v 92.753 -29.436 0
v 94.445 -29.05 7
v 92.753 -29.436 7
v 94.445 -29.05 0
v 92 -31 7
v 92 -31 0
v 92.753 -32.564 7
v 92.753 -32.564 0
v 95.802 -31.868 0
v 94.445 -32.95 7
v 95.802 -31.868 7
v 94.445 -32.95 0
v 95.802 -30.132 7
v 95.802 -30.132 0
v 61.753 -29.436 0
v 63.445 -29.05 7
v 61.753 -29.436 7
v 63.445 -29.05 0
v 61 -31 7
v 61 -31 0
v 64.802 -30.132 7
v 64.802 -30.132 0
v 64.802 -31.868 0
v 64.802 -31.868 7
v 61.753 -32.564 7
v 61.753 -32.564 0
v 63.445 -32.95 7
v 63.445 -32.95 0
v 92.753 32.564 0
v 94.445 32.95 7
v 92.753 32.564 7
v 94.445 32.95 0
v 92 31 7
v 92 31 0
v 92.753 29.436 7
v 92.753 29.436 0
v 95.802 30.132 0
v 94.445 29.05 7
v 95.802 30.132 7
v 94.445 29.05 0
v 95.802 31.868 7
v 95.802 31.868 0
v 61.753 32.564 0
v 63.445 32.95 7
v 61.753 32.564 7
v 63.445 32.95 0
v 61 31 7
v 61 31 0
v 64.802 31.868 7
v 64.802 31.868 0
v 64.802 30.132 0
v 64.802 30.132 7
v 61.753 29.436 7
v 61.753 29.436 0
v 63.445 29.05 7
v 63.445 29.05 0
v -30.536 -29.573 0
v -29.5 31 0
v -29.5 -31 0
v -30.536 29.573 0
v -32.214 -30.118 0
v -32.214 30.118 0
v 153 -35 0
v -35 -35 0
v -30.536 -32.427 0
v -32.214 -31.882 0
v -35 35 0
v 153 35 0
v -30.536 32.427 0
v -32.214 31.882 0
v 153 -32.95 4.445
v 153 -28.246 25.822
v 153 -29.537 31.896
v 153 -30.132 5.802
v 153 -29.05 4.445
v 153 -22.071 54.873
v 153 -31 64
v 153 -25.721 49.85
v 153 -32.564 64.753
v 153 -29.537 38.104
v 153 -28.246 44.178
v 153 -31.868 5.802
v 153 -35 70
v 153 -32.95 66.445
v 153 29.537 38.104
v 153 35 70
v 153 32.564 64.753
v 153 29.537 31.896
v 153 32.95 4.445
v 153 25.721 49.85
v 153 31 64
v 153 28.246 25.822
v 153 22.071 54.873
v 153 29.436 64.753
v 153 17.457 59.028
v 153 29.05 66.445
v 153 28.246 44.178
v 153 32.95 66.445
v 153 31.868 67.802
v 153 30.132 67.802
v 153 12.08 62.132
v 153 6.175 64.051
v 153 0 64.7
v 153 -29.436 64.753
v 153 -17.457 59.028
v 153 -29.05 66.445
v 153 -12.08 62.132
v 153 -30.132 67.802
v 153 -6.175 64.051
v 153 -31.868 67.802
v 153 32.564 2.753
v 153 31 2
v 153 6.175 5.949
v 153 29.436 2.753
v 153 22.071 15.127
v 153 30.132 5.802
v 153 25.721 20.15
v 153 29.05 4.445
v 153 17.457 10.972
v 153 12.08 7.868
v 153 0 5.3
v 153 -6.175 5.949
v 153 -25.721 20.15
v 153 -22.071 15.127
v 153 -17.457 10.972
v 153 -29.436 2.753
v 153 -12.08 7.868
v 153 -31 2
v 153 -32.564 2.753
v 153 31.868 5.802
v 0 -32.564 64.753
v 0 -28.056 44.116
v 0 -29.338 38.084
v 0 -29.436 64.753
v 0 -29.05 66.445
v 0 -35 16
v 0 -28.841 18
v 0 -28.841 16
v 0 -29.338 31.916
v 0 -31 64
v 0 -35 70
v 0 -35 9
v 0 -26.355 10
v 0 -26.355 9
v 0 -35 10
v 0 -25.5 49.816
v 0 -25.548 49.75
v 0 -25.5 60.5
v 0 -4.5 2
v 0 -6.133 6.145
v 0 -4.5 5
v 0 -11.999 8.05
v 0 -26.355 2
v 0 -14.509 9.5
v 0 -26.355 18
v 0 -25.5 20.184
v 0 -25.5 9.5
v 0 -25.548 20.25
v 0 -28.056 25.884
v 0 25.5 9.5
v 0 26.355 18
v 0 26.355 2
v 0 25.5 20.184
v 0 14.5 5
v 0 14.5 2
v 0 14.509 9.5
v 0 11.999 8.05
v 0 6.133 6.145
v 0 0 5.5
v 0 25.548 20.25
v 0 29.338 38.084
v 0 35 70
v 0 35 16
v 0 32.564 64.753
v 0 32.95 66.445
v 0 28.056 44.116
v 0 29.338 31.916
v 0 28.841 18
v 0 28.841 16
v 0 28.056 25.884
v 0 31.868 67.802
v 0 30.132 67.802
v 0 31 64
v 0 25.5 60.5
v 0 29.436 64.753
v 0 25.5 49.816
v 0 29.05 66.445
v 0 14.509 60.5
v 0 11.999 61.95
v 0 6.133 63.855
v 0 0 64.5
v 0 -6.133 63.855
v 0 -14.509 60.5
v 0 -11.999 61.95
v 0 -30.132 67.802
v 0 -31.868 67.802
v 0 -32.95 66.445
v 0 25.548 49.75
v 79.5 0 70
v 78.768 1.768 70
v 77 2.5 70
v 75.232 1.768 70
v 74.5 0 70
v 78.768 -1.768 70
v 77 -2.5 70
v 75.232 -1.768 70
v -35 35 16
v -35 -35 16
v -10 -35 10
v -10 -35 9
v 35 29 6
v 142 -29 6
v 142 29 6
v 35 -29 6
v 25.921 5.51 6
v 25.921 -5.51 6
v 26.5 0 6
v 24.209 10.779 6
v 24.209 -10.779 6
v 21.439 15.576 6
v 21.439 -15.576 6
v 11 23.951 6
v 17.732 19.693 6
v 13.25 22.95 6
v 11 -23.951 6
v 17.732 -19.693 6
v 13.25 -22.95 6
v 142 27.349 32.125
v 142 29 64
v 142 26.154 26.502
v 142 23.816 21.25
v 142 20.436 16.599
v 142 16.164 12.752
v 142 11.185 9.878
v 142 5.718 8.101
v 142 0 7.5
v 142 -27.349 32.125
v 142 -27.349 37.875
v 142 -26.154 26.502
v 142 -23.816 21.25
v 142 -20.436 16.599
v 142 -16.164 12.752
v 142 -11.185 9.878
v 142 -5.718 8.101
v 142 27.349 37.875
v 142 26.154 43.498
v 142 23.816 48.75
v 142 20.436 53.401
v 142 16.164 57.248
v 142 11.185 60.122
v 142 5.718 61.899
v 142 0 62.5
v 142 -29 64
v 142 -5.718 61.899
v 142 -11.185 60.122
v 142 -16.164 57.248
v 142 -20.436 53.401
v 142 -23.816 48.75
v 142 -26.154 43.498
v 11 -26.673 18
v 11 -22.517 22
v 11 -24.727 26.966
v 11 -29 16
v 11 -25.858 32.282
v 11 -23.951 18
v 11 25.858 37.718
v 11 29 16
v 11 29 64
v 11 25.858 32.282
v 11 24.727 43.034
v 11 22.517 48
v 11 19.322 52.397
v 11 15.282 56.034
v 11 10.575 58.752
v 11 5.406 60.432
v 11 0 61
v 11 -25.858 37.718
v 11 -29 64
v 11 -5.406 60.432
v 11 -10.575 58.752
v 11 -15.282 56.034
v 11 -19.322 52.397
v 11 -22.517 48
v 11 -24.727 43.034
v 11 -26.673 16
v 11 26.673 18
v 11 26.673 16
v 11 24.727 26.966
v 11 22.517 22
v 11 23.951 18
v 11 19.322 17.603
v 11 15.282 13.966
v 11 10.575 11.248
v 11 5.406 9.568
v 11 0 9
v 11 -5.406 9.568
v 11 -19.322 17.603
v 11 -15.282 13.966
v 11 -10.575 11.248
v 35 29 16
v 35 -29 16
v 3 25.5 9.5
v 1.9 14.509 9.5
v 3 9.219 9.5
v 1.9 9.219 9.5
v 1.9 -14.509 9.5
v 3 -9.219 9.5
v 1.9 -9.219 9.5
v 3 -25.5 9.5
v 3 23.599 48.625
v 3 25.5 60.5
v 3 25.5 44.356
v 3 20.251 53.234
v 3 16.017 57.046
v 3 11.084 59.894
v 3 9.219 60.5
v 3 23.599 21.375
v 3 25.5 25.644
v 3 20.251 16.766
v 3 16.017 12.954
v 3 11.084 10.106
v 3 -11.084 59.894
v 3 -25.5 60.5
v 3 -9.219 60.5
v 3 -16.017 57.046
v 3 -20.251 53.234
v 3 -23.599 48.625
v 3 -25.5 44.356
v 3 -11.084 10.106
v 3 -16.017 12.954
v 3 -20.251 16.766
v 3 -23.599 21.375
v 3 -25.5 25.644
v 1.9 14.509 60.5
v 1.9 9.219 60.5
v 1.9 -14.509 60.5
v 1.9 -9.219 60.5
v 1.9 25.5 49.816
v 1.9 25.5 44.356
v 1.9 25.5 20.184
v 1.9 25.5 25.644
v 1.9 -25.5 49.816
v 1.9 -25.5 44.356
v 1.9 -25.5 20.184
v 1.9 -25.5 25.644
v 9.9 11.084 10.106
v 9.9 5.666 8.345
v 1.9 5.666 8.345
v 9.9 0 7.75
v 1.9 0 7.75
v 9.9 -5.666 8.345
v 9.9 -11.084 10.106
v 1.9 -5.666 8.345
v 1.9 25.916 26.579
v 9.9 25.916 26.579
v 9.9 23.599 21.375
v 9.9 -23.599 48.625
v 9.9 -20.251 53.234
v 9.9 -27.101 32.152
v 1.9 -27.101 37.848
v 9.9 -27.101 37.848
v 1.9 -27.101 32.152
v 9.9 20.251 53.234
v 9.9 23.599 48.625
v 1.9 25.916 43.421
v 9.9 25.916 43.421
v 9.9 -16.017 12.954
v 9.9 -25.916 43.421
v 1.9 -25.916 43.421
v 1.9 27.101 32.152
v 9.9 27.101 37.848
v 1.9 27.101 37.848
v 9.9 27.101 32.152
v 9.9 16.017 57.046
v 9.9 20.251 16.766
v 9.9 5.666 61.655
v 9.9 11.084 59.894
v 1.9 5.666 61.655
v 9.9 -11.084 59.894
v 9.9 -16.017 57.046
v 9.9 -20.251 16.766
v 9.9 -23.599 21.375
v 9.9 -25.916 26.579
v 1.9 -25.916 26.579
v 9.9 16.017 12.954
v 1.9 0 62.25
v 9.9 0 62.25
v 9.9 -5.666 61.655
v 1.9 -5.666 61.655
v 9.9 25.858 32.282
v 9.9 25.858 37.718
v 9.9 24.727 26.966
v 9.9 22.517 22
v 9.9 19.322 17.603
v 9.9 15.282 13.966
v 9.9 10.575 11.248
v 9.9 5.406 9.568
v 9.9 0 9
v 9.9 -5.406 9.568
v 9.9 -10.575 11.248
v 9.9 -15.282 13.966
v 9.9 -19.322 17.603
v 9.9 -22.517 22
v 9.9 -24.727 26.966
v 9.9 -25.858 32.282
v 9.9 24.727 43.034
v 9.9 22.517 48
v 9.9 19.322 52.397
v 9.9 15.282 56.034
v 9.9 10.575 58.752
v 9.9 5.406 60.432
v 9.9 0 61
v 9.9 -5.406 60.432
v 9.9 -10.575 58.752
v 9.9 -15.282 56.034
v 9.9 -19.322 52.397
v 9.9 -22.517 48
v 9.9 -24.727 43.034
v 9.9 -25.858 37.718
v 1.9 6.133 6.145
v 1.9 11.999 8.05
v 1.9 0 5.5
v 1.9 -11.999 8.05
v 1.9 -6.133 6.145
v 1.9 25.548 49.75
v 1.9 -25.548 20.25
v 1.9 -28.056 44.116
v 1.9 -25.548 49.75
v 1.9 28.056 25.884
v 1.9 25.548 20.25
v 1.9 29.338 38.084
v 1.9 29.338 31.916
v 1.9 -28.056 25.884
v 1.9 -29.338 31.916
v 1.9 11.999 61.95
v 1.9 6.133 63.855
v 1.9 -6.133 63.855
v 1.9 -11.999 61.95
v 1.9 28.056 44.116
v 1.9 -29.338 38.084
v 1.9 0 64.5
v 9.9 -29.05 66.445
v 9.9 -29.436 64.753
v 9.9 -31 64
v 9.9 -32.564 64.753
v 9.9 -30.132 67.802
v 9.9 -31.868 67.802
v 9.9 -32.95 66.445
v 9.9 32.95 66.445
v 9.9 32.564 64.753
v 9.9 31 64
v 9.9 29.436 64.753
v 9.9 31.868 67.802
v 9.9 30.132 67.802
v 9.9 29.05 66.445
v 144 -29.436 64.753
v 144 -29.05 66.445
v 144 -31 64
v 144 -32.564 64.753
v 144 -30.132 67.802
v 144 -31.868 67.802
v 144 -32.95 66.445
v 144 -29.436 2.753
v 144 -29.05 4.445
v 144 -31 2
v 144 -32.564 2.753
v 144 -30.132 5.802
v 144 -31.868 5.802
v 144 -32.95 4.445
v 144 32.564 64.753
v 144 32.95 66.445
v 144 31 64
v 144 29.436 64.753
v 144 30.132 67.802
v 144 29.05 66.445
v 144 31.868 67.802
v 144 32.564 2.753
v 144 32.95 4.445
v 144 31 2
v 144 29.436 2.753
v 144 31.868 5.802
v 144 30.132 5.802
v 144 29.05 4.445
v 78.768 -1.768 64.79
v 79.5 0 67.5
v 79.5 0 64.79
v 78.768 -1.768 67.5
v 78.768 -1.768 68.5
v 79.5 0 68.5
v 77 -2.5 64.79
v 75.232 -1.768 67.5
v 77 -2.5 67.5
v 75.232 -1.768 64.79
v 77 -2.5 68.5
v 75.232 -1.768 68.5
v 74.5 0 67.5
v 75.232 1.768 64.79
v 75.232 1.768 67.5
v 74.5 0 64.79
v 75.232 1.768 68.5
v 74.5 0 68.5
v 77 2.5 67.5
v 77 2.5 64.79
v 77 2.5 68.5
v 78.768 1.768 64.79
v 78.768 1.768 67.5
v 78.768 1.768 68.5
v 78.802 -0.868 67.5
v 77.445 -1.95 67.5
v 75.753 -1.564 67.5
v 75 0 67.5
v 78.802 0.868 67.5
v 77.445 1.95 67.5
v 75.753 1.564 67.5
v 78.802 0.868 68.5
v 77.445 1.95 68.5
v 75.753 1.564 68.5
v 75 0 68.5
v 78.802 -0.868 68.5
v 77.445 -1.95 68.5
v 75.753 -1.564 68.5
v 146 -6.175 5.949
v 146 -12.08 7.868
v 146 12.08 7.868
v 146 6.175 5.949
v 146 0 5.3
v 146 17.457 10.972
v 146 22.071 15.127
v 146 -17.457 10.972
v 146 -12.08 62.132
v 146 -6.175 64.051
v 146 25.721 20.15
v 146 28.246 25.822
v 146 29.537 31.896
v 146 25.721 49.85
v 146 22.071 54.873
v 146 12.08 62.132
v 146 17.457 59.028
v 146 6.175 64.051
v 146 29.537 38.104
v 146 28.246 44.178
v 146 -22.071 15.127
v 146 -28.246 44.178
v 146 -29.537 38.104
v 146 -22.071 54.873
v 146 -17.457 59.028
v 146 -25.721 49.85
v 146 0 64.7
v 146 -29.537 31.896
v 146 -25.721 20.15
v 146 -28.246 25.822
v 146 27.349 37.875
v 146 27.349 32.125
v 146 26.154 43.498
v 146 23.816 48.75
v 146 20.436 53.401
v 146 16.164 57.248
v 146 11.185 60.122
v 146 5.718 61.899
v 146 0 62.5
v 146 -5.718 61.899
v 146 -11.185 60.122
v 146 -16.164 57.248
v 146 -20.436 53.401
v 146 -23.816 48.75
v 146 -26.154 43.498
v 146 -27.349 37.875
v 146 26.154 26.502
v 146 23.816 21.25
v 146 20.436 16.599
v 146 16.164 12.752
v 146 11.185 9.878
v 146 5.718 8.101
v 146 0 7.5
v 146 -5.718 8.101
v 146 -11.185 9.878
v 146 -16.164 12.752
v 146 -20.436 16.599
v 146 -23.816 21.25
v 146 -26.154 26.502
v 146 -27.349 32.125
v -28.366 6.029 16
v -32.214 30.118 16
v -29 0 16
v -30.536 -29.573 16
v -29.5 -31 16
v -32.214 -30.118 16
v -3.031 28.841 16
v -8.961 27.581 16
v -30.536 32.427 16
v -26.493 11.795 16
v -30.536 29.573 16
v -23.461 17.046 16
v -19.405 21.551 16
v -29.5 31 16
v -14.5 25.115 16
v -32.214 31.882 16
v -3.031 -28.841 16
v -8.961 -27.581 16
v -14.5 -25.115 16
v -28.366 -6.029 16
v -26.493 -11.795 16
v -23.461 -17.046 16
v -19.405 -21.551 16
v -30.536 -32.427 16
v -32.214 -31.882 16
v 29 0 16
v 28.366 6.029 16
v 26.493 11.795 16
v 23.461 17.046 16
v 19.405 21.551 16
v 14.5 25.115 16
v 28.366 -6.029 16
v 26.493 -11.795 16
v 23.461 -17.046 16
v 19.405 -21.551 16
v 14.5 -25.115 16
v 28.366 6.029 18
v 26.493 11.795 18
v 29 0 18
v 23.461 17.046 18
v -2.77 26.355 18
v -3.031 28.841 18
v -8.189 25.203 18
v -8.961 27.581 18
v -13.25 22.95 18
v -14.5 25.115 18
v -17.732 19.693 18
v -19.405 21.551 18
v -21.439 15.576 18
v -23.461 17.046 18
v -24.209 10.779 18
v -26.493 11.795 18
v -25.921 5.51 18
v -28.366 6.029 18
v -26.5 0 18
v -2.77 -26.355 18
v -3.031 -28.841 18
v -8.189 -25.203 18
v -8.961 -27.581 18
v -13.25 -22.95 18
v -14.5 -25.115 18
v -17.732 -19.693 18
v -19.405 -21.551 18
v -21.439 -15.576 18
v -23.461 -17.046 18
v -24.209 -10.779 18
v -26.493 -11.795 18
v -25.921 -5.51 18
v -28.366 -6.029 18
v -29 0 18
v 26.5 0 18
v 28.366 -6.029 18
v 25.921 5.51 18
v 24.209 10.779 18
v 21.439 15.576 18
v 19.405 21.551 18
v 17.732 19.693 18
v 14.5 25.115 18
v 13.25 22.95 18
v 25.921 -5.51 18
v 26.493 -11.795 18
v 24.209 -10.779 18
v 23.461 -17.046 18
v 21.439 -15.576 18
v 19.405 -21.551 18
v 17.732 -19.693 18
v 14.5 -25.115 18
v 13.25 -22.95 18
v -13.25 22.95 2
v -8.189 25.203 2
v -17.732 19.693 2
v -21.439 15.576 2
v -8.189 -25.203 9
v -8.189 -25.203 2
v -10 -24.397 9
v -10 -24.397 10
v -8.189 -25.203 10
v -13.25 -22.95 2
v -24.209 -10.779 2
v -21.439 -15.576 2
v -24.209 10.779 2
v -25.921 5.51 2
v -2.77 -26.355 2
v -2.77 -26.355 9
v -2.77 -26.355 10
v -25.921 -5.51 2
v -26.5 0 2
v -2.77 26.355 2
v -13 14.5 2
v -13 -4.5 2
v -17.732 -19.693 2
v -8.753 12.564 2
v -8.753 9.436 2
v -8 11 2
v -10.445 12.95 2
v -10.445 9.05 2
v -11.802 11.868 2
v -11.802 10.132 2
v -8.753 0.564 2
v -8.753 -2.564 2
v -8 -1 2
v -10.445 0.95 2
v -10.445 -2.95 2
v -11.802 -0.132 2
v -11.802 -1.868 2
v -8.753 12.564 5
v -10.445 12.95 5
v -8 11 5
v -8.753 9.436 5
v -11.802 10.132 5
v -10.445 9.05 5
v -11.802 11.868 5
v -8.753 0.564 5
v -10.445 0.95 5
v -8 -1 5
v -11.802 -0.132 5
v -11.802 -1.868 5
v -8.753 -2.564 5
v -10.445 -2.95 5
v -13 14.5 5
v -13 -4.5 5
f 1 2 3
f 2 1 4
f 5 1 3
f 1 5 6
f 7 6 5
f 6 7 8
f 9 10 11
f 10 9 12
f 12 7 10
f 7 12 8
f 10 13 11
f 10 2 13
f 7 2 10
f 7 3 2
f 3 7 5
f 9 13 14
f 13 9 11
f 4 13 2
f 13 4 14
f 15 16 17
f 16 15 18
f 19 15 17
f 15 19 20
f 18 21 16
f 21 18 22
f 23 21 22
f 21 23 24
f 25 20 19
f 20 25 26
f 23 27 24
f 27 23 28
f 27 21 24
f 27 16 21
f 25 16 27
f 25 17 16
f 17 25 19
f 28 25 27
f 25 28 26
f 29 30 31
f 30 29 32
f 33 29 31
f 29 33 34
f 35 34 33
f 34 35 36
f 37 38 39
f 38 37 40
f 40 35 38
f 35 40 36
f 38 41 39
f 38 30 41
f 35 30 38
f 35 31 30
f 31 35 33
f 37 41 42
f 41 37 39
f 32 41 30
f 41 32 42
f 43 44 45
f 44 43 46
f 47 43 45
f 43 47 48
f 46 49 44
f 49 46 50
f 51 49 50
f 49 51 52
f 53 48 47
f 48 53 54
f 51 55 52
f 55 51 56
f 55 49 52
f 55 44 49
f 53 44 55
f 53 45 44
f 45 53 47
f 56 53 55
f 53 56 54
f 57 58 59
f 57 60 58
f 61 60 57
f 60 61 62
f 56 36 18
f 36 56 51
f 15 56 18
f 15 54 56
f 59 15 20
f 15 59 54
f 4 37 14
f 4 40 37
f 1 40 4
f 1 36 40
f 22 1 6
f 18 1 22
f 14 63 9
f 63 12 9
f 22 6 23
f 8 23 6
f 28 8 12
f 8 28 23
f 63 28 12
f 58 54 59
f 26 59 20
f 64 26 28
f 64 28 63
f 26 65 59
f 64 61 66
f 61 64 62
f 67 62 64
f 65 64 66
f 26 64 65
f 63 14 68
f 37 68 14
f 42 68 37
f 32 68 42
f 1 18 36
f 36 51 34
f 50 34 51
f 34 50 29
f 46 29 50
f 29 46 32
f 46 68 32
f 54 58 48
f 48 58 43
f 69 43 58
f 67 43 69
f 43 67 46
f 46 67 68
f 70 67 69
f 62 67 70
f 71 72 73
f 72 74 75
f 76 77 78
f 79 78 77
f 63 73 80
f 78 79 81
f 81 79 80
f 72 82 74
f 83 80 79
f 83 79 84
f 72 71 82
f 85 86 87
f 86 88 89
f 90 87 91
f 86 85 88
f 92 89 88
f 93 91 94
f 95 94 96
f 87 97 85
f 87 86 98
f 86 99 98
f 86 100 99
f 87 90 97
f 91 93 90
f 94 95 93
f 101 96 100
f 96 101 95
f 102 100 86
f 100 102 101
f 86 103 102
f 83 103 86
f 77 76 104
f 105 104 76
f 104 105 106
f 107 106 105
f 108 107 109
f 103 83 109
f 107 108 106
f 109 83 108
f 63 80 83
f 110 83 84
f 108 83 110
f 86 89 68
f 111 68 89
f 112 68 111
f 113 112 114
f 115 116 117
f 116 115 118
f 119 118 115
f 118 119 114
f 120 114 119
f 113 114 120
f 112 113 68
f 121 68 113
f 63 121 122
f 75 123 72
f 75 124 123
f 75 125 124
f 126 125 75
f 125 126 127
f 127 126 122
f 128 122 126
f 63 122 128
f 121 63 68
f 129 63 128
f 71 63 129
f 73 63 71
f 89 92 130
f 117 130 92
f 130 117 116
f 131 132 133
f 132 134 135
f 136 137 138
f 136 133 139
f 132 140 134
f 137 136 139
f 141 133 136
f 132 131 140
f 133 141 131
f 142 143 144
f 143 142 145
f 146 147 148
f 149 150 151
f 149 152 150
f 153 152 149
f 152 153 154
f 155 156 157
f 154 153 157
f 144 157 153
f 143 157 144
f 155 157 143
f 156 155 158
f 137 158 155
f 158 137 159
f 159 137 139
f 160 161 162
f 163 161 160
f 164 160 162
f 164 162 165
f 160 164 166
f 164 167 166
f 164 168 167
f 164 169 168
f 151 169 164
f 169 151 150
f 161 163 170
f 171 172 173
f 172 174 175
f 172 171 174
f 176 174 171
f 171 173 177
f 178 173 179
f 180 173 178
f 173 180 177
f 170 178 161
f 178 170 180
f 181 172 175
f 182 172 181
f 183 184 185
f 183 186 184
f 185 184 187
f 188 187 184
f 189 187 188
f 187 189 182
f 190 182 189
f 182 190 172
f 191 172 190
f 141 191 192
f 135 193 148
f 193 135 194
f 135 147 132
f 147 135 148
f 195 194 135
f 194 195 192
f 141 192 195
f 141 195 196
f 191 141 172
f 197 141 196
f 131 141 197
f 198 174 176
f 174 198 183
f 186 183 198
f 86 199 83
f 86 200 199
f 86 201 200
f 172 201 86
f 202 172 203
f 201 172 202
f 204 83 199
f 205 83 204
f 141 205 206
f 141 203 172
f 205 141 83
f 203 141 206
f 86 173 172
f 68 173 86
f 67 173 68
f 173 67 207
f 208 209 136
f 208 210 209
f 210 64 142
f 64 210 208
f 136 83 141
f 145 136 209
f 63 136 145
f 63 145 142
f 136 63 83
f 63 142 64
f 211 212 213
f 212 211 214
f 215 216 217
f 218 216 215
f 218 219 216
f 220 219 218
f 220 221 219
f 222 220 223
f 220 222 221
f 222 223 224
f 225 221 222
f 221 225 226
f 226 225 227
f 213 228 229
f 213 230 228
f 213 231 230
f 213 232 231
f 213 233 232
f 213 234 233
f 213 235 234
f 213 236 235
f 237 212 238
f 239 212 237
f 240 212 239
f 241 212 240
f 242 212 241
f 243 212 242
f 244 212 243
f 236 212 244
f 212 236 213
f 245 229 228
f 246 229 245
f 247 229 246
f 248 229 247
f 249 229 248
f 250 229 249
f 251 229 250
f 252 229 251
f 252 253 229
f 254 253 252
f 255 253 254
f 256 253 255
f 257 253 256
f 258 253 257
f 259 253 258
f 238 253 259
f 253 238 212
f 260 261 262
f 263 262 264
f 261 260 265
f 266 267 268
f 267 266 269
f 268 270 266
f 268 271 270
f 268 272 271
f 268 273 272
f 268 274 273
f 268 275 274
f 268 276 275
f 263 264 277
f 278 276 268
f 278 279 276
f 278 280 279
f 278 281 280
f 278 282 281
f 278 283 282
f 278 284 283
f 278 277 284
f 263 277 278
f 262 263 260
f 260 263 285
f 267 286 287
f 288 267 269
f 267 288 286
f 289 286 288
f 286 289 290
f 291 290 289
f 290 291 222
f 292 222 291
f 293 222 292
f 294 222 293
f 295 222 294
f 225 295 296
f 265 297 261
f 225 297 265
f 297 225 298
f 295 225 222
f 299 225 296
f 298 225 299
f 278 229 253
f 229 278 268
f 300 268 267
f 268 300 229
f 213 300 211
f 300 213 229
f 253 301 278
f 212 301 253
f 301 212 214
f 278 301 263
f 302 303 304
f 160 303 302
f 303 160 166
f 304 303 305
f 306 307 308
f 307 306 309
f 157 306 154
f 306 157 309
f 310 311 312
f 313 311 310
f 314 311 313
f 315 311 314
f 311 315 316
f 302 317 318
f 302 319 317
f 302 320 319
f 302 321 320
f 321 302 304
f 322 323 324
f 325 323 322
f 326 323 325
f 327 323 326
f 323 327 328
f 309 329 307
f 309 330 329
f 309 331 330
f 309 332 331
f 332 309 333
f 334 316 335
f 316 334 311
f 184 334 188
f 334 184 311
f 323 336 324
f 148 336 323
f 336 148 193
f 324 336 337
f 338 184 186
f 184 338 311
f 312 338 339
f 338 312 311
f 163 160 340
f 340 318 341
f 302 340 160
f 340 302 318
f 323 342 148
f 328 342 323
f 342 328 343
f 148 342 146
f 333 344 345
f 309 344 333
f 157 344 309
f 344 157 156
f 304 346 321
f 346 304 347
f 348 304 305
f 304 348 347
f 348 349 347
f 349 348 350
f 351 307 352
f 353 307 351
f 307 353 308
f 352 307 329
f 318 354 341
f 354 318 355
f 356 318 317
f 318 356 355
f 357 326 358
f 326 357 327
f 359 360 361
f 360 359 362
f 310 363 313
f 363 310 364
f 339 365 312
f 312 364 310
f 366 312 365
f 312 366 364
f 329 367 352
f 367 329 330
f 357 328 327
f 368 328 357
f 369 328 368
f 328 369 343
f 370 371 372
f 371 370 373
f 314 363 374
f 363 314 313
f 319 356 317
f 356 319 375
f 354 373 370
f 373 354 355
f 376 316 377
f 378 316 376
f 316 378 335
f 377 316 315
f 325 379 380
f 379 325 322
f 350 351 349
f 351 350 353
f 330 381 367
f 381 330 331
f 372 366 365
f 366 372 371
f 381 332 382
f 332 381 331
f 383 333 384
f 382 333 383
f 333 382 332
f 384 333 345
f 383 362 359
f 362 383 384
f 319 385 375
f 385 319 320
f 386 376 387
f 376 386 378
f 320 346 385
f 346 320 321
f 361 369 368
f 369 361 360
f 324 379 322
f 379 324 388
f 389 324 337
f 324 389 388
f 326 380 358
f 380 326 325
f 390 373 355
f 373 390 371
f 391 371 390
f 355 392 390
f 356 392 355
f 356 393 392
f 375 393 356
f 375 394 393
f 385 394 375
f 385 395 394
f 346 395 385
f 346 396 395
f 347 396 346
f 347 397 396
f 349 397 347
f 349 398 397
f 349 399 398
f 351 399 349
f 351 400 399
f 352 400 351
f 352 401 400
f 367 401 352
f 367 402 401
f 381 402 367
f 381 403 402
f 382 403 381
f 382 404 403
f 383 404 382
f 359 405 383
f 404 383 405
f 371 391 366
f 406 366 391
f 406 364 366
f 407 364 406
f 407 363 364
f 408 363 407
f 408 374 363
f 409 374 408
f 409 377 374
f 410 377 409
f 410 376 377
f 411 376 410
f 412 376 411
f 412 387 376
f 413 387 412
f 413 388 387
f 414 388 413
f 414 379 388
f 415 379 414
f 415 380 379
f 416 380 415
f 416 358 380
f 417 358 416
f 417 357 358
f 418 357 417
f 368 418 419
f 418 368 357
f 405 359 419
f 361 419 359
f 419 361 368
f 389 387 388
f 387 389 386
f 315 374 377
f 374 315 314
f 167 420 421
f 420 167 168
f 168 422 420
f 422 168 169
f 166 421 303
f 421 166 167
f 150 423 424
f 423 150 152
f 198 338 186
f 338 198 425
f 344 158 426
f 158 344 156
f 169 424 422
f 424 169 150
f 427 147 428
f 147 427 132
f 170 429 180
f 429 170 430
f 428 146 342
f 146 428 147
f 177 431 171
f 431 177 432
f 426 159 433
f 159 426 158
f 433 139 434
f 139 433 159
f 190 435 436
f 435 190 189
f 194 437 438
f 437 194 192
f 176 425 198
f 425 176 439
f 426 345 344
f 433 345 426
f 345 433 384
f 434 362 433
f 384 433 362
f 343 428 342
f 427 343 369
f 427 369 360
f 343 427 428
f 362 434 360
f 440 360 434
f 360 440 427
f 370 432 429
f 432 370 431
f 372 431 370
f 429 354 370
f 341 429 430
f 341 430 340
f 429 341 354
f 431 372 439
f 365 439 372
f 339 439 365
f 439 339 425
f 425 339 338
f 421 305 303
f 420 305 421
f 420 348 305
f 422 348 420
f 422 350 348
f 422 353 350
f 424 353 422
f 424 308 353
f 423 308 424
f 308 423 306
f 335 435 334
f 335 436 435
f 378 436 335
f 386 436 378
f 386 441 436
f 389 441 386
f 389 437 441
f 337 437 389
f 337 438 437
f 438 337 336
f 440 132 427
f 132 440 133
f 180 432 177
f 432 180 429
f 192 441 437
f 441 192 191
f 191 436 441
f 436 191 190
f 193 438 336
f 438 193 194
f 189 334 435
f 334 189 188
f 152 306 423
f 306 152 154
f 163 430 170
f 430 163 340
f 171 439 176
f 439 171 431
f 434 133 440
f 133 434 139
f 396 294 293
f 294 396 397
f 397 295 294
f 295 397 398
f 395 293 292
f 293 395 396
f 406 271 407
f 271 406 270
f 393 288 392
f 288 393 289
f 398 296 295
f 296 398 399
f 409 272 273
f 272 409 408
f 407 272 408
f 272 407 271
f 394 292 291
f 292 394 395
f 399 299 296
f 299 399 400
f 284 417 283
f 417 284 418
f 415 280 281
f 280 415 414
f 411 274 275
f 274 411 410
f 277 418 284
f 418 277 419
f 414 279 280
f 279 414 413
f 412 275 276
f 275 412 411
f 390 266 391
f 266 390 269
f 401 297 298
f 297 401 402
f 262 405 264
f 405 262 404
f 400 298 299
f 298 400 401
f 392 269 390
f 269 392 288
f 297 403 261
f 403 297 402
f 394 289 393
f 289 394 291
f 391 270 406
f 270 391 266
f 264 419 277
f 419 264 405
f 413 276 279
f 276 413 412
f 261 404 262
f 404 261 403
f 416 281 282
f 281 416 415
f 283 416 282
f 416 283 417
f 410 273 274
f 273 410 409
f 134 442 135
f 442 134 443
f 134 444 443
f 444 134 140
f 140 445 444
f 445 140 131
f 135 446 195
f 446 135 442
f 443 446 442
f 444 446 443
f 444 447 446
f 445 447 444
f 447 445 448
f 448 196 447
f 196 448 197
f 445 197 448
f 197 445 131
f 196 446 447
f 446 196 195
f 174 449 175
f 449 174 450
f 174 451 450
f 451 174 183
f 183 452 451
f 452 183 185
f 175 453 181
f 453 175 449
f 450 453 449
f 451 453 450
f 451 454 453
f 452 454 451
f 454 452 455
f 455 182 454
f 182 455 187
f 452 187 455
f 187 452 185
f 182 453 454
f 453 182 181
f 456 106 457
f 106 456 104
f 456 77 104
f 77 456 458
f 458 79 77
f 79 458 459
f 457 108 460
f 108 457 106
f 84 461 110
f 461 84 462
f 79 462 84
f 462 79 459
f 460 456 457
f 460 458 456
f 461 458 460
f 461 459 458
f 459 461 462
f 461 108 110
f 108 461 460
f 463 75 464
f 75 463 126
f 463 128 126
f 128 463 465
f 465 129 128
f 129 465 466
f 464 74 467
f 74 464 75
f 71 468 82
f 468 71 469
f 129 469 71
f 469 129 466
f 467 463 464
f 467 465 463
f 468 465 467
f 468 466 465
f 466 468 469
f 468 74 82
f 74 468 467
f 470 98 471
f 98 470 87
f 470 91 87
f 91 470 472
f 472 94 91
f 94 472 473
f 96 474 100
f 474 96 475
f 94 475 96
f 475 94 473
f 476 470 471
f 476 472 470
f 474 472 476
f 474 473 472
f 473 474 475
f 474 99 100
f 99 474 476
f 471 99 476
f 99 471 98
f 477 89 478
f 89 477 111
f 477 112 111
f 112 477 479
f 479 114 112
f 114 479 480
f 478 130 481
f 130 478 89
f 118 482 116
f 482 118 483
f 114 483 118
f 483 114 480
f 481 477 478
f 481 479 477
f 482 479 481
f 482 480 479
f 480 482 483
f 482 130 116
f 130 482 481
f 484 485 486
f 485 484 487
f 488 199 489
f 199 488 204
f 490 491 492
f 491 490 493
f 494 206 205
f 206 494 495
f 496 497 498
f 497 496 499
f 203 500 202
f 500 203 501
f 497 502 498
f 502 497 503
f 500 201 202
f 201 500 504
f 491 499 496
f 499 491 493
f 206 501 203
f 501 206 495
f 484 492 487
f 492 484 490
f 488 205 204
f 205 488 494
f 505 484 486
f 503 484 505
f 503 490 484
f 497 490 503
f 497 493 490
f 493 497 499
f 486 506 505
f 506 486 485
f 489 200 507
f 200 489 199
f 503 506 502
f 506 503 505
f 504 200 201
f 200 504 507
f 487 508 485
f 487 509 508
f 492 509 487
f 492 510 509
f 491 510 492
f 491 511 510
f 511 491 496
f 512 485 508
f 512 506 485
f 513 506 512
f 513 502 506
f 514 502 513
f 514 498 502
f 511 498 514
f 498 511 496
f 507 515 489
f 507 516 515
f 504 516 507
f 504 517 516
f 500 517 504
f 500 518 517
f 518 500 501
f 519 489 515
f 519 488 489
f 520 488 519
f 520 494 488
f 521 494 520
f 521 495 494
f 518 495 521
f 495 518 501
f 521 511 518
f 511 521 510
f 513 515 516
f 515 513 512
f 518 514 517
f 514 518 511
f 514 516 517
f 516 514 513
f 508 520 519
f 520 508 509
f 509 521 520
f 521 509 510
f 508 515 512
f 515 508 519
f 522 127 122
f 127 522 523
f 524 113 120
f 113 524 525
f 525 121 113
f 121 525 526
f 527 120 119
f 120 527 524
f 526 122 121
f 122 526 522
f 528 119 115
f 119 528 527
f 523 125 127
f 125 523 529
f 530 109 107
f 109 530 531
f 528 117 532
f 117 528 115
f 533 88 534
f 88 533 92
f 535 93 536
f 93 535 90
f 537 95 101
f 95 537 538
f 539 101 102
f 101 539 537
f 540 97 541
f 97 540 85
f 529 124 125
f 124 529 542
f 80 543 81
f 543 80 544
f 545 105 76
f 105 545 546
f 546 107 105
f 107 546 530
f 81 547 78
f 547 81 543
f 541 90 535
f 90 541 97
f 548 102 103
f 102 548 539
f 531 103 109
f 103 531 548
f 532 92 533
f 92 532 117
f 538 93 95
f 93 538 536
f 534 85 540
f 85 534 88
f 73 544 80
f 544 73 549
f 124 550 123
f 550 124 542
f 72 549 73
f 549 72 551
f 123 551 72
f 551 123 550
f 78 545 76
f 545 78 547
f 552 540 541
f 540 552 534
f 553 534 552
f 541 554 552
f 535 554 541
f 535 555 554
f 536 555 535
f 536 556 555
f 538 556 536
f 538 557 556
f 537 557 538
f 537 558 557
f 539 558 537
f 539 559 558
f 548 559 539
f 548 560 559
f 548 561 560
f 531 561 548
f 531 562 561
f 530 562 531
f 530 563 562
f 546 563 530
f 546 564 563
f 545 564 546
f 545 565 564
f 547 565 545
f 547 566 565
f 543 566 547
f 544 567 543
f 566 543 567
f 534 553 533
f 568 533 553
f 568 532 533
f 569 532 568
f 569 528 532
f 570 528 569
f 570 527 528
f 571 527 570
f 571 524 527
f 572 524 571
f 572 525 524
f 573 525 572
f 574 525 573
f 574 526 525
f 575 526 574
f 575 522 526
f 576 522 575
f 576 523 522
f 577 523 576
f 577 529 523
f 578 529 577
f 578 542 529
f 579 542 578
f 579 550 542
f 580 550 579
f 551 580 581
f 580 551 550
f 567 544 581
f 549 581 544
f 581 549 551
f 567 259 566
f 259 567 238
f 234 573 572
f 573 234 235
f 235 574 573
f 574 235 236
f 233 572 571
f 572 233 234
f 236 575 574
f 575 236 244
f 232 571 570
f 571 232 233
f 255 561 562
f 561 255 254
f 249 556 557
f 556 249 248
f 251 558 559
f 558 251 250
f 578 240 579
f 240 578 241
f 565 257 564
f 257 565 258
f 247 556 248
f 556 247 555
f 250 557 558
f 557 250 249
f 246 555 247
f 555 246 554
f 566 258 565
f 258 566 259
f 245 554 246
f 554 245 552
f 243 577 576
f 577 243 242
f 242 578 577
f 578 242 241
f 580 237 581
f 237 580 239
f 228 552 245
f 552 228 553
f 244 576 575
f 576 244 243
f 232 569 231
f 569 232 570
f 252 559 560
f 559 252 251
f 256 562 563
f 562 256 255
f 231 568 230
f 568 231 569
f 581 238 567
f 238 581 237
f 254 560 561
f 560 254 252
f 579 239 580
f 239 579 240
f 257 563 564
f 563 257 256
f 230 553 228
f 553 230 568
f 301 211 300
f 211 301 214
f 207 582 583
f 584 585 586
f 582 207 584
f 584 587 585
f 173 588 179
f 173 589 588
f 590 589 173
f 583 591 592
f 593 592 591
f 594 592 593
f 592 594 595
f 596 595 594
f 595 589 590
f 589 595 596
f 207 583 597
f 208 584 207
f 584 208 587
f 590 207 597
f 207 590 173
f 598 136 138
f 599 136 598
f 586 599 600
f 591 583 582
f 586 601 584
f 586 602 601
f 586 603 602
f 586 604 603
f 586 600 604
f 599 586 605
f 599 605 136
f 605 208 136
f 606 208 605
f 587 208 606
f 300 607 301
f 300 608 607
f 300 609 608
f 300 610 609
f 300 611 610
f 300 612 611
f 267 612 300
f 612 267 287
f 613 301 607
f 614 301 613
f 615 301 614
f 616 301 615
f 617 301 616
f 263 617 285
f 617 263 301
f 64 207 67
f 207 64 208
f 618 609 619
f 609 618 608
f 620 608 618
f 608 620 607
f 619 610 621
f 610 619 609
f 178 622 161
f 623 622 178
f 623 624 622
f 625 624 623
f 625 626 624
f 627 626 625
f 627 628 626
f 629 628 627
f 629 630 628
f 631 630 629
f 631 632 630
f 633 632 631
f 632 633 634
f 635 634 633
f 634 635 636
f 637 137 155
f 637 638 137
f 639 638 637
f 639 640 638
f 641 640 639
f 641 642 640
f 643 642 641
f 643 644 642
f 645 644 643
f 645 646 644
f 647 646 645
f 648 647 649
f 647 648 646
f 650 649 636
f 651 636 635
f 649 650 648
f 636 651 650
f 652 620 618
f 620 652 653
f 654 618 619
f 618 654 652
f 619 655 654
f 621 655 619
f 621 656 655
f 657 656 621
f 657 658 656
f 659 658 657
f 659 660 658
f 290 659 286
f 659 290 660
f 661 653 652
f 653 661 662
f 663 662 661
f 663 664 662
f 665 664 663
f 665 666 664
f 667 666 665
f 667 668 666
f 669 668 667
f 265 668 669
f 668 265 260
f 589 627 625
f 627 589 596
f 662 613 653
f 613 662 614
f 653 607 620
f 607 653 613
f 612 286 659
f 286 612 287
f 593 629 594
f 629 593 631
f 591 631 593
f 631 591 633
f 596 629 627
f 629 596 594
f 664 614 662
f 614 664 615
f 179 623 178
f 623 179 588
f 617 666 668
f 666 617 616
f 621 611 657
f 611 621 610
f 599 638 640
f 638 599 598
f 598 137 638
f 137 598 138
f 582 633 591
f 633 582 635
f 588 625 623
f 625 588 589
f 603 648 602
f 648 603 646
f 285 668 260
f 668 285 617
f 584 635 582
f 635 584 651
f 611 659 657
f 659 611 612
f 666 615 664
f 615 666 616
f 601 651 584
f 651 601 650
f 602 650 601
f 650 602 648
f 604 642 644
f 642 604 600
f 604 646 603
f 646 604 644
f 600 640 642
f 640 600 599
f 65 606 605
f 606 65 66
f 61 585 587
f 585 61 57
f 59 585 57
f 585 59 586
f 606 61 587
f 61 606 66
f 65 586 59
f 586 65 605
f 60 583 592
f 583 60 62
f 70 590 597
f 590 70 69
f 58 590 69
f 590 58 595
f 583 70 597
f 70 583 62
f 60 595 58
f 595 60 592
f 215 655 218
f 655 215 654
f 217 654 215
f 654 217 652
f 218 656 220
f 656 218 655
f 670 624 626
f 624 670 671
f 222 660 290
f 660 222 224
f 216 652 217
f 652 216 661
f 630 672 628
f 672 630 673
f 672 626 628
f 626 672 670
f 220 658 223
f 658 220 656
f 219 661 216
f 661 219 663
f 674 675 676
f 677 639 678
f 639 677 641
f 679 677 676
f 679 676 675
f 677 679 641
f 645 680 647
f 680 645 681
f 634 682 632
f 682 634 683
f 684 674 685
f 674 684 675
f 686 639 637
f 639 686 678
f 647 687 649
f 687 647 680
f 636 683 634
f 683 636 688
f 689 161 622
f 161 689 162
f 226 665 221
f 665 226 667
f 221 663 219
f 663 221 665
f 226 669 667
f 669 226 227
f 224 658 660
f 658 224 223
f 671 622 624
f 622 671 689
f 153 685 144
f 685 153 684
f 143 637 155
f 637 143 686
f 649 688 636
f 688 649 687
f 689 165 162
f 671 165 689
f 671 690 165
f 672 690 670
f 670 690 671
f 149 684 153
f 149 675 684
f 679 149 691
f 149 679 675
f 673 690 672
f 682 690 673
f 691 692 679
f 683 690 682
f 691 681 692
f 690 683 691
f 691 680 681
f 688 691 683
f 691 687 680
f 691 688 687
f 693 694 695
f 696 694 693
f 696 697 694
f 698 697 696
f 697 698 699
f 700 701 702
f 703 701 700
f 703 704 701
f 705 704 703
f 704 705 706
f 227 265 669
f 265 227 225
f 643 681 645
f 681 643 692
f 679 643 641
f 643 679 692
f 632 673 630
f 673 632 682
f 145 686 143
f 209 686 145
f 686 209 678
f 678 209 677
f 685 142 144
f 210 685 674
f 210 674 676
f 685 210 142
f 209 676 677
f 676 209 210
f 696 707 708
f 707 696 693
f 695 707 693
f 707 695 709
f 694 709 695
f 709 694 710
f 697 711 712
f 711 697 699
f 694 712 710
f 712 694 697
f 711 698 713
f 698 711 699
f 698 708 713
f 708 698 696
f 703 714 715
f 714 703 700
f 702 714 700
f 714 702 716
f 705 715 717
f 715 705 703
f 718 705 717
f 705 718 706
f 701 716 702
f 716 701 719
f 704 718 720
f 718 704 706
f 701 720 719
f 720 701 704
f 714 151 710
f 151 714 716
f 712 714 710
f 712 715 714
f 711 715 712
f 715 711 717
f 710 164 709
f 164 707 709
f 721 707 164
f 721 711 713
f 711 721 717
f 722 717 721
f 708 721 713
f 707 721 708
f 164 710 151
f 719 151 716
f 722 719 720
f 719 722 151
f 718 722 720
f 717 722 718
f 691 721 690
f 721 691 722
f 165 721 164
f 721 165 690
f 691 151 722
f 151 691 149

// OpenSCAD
// file: Tubo.scad
bigW = 70;
ori = bigW/2;
raspSellR = 59;
tuboH = 140;
H = tuboH+2+8+1+2;
selloH = 7;

huecoPared = 12;
huecoH = 22;

translate([0,0,bigW/2])
rotate([0,90,0])
bigTuboHueco();

module bigTuboHueco()
{
	difference()
	{
		bigTubo();	
		sello();
	}
}


module sello()
{
	translate([0,0,H-selloH])
	cylinder(r=(raspSellR/2)+0.2,selloH+0.1);
	
	translate([0,0,H-selloH-30])
	cylinder(r=(raspSellR/2)-2,selloH+40);
}


module bigTubo(){

difference(){

//Bloque
translate([-bigW/2,-bigW/2,0])
cube([bigW,bigW,H]);


translate([
						-(bigW-huecoPared)/2,
						-(bigW-huecoPared)/2,
						(huecoH/2)
					])
		cube([
					bigW-huecoPared,
					bigW-huecoPared,
					H-huecoH]
				);


//Diffractador
translate([-25.5,-25.5,-0.1])
cube([51,51,3.1]);

//Macro
translate([0,0,-0.1])
cylinder(r=(54.5/2),10);

//Sello de raspberry
translate([0,0,-0.1])
cylinder(r=(raspSellR/2),2);

//Tubo
translate([0,0,-0.1])
cylinder(r=(52/2),200);

//Tornillos abajo
translate([-ori+4,-ori+4,-0.1])
cylinder(r=2,10);
translate([ori-4,-ori+4,-0.1])
cylinder(r=2,10);
translate([-ori+4,ori-4,-0.1])
cylinder(r=2,10);
translate([ori-4,ori-4,-0.1])
cylinder(r=2,10);

//Hueco
//translate([0,0,2+8+1+2])
//cylinder(r=(raspSellR/2),tuboH+0.1);

//Tornillos arriba
translate([-ori+4,-ori+4,H-9])
cylinder(r=2,10);
translate([ori-4,-ori+4,H-9])
cylinder(r=2,10);
translate([-ori+4,ori-4,H-9])
cylinder(r=2,10);
translate([ori-4,ori-4,H-9])
cylinder(r=2,10);

//Tornillos caja
translate([0,0,(tuboH/2)-7])
rotate([0,90,0])
tornillosArriba();

//Tornillo tripie
translate([-ori-0.1,0,(tuboH/2)+7])
rotate([0,90,0])
cylinder(r=5/2,5.31);


}


//Rosca tornillo tripie
difference(){
translate([-ori+1.5,0,(tuboH/2)+7])
rotate([0,90,0])
cylinder(r=5,1);

translate([-ori+1.4,0,(tuboH/2)+7])
rotate([0,90,0])
cylinder(r=5-3,3);


}

}

module tornillosArriba(){
translate([-ori+4,-ori+4,ori-7])
cylinder(r=2,10);
translate([0,-ori+4,ori-7])
cylinder(r=2,10);
translate([-ori+4,ori-4,ori-7])
cylinder(r=2,10);
translate([0,ori-4,ori-7])
cylinder(r=2,10);
}


module tornilloTripie(){
	
}
// main file
include <Tubo.scad>



//translate([0,0,30])
//bigTubo();

Camara();




module Camara(){

//Alsa para cámara
//translate([-12.5,-10,5])
//cube([25,24,2]);

difference(){

//Crear bloque
creaBloqueCam();

//Tornillos abajo
translate([-ori+4,-ori+4,-0.1])
cylinder(r=1.5,30);
translate([ori-4,-ori+4,-0.1])
cylinder(r=1.5,30);
translate([-ori+4,ori-4,-0.1])
cylinder(r=1.5,30);
translate([ori-4,ori-4,-0.1])
cylinder(r=1.5,30);

//Tubo para camara
translate([0,0,2])
cylinder(r=(raspSellR/2)-3,18);

//Ranura cable
translate([-10,-ori-5,9])
cube([20,20,1]);

}


difference(){

translate([-13,-4.5,1])
cube([26,19,4]);

tornCam();
}





}


module tornCam(){
//Tornillos camara
translate([-10,11,-0.1])
cylinder(r=2,30);
translate([10,11,-0.1])
cylinder(r=2,30);
translate([-10,-1,-0.1])
cylinder(r=2,30);
translate([10,-1,-0.1])
cylinder(r=2,30);
}


module creaBloqueCam(){
//Bloque
translate([-bigW/2,-bigW/2,0])
cube([bigW,bigW,16]);

//Sello
cylinder(r=(raspSellR/2)-0.5,18);


}
